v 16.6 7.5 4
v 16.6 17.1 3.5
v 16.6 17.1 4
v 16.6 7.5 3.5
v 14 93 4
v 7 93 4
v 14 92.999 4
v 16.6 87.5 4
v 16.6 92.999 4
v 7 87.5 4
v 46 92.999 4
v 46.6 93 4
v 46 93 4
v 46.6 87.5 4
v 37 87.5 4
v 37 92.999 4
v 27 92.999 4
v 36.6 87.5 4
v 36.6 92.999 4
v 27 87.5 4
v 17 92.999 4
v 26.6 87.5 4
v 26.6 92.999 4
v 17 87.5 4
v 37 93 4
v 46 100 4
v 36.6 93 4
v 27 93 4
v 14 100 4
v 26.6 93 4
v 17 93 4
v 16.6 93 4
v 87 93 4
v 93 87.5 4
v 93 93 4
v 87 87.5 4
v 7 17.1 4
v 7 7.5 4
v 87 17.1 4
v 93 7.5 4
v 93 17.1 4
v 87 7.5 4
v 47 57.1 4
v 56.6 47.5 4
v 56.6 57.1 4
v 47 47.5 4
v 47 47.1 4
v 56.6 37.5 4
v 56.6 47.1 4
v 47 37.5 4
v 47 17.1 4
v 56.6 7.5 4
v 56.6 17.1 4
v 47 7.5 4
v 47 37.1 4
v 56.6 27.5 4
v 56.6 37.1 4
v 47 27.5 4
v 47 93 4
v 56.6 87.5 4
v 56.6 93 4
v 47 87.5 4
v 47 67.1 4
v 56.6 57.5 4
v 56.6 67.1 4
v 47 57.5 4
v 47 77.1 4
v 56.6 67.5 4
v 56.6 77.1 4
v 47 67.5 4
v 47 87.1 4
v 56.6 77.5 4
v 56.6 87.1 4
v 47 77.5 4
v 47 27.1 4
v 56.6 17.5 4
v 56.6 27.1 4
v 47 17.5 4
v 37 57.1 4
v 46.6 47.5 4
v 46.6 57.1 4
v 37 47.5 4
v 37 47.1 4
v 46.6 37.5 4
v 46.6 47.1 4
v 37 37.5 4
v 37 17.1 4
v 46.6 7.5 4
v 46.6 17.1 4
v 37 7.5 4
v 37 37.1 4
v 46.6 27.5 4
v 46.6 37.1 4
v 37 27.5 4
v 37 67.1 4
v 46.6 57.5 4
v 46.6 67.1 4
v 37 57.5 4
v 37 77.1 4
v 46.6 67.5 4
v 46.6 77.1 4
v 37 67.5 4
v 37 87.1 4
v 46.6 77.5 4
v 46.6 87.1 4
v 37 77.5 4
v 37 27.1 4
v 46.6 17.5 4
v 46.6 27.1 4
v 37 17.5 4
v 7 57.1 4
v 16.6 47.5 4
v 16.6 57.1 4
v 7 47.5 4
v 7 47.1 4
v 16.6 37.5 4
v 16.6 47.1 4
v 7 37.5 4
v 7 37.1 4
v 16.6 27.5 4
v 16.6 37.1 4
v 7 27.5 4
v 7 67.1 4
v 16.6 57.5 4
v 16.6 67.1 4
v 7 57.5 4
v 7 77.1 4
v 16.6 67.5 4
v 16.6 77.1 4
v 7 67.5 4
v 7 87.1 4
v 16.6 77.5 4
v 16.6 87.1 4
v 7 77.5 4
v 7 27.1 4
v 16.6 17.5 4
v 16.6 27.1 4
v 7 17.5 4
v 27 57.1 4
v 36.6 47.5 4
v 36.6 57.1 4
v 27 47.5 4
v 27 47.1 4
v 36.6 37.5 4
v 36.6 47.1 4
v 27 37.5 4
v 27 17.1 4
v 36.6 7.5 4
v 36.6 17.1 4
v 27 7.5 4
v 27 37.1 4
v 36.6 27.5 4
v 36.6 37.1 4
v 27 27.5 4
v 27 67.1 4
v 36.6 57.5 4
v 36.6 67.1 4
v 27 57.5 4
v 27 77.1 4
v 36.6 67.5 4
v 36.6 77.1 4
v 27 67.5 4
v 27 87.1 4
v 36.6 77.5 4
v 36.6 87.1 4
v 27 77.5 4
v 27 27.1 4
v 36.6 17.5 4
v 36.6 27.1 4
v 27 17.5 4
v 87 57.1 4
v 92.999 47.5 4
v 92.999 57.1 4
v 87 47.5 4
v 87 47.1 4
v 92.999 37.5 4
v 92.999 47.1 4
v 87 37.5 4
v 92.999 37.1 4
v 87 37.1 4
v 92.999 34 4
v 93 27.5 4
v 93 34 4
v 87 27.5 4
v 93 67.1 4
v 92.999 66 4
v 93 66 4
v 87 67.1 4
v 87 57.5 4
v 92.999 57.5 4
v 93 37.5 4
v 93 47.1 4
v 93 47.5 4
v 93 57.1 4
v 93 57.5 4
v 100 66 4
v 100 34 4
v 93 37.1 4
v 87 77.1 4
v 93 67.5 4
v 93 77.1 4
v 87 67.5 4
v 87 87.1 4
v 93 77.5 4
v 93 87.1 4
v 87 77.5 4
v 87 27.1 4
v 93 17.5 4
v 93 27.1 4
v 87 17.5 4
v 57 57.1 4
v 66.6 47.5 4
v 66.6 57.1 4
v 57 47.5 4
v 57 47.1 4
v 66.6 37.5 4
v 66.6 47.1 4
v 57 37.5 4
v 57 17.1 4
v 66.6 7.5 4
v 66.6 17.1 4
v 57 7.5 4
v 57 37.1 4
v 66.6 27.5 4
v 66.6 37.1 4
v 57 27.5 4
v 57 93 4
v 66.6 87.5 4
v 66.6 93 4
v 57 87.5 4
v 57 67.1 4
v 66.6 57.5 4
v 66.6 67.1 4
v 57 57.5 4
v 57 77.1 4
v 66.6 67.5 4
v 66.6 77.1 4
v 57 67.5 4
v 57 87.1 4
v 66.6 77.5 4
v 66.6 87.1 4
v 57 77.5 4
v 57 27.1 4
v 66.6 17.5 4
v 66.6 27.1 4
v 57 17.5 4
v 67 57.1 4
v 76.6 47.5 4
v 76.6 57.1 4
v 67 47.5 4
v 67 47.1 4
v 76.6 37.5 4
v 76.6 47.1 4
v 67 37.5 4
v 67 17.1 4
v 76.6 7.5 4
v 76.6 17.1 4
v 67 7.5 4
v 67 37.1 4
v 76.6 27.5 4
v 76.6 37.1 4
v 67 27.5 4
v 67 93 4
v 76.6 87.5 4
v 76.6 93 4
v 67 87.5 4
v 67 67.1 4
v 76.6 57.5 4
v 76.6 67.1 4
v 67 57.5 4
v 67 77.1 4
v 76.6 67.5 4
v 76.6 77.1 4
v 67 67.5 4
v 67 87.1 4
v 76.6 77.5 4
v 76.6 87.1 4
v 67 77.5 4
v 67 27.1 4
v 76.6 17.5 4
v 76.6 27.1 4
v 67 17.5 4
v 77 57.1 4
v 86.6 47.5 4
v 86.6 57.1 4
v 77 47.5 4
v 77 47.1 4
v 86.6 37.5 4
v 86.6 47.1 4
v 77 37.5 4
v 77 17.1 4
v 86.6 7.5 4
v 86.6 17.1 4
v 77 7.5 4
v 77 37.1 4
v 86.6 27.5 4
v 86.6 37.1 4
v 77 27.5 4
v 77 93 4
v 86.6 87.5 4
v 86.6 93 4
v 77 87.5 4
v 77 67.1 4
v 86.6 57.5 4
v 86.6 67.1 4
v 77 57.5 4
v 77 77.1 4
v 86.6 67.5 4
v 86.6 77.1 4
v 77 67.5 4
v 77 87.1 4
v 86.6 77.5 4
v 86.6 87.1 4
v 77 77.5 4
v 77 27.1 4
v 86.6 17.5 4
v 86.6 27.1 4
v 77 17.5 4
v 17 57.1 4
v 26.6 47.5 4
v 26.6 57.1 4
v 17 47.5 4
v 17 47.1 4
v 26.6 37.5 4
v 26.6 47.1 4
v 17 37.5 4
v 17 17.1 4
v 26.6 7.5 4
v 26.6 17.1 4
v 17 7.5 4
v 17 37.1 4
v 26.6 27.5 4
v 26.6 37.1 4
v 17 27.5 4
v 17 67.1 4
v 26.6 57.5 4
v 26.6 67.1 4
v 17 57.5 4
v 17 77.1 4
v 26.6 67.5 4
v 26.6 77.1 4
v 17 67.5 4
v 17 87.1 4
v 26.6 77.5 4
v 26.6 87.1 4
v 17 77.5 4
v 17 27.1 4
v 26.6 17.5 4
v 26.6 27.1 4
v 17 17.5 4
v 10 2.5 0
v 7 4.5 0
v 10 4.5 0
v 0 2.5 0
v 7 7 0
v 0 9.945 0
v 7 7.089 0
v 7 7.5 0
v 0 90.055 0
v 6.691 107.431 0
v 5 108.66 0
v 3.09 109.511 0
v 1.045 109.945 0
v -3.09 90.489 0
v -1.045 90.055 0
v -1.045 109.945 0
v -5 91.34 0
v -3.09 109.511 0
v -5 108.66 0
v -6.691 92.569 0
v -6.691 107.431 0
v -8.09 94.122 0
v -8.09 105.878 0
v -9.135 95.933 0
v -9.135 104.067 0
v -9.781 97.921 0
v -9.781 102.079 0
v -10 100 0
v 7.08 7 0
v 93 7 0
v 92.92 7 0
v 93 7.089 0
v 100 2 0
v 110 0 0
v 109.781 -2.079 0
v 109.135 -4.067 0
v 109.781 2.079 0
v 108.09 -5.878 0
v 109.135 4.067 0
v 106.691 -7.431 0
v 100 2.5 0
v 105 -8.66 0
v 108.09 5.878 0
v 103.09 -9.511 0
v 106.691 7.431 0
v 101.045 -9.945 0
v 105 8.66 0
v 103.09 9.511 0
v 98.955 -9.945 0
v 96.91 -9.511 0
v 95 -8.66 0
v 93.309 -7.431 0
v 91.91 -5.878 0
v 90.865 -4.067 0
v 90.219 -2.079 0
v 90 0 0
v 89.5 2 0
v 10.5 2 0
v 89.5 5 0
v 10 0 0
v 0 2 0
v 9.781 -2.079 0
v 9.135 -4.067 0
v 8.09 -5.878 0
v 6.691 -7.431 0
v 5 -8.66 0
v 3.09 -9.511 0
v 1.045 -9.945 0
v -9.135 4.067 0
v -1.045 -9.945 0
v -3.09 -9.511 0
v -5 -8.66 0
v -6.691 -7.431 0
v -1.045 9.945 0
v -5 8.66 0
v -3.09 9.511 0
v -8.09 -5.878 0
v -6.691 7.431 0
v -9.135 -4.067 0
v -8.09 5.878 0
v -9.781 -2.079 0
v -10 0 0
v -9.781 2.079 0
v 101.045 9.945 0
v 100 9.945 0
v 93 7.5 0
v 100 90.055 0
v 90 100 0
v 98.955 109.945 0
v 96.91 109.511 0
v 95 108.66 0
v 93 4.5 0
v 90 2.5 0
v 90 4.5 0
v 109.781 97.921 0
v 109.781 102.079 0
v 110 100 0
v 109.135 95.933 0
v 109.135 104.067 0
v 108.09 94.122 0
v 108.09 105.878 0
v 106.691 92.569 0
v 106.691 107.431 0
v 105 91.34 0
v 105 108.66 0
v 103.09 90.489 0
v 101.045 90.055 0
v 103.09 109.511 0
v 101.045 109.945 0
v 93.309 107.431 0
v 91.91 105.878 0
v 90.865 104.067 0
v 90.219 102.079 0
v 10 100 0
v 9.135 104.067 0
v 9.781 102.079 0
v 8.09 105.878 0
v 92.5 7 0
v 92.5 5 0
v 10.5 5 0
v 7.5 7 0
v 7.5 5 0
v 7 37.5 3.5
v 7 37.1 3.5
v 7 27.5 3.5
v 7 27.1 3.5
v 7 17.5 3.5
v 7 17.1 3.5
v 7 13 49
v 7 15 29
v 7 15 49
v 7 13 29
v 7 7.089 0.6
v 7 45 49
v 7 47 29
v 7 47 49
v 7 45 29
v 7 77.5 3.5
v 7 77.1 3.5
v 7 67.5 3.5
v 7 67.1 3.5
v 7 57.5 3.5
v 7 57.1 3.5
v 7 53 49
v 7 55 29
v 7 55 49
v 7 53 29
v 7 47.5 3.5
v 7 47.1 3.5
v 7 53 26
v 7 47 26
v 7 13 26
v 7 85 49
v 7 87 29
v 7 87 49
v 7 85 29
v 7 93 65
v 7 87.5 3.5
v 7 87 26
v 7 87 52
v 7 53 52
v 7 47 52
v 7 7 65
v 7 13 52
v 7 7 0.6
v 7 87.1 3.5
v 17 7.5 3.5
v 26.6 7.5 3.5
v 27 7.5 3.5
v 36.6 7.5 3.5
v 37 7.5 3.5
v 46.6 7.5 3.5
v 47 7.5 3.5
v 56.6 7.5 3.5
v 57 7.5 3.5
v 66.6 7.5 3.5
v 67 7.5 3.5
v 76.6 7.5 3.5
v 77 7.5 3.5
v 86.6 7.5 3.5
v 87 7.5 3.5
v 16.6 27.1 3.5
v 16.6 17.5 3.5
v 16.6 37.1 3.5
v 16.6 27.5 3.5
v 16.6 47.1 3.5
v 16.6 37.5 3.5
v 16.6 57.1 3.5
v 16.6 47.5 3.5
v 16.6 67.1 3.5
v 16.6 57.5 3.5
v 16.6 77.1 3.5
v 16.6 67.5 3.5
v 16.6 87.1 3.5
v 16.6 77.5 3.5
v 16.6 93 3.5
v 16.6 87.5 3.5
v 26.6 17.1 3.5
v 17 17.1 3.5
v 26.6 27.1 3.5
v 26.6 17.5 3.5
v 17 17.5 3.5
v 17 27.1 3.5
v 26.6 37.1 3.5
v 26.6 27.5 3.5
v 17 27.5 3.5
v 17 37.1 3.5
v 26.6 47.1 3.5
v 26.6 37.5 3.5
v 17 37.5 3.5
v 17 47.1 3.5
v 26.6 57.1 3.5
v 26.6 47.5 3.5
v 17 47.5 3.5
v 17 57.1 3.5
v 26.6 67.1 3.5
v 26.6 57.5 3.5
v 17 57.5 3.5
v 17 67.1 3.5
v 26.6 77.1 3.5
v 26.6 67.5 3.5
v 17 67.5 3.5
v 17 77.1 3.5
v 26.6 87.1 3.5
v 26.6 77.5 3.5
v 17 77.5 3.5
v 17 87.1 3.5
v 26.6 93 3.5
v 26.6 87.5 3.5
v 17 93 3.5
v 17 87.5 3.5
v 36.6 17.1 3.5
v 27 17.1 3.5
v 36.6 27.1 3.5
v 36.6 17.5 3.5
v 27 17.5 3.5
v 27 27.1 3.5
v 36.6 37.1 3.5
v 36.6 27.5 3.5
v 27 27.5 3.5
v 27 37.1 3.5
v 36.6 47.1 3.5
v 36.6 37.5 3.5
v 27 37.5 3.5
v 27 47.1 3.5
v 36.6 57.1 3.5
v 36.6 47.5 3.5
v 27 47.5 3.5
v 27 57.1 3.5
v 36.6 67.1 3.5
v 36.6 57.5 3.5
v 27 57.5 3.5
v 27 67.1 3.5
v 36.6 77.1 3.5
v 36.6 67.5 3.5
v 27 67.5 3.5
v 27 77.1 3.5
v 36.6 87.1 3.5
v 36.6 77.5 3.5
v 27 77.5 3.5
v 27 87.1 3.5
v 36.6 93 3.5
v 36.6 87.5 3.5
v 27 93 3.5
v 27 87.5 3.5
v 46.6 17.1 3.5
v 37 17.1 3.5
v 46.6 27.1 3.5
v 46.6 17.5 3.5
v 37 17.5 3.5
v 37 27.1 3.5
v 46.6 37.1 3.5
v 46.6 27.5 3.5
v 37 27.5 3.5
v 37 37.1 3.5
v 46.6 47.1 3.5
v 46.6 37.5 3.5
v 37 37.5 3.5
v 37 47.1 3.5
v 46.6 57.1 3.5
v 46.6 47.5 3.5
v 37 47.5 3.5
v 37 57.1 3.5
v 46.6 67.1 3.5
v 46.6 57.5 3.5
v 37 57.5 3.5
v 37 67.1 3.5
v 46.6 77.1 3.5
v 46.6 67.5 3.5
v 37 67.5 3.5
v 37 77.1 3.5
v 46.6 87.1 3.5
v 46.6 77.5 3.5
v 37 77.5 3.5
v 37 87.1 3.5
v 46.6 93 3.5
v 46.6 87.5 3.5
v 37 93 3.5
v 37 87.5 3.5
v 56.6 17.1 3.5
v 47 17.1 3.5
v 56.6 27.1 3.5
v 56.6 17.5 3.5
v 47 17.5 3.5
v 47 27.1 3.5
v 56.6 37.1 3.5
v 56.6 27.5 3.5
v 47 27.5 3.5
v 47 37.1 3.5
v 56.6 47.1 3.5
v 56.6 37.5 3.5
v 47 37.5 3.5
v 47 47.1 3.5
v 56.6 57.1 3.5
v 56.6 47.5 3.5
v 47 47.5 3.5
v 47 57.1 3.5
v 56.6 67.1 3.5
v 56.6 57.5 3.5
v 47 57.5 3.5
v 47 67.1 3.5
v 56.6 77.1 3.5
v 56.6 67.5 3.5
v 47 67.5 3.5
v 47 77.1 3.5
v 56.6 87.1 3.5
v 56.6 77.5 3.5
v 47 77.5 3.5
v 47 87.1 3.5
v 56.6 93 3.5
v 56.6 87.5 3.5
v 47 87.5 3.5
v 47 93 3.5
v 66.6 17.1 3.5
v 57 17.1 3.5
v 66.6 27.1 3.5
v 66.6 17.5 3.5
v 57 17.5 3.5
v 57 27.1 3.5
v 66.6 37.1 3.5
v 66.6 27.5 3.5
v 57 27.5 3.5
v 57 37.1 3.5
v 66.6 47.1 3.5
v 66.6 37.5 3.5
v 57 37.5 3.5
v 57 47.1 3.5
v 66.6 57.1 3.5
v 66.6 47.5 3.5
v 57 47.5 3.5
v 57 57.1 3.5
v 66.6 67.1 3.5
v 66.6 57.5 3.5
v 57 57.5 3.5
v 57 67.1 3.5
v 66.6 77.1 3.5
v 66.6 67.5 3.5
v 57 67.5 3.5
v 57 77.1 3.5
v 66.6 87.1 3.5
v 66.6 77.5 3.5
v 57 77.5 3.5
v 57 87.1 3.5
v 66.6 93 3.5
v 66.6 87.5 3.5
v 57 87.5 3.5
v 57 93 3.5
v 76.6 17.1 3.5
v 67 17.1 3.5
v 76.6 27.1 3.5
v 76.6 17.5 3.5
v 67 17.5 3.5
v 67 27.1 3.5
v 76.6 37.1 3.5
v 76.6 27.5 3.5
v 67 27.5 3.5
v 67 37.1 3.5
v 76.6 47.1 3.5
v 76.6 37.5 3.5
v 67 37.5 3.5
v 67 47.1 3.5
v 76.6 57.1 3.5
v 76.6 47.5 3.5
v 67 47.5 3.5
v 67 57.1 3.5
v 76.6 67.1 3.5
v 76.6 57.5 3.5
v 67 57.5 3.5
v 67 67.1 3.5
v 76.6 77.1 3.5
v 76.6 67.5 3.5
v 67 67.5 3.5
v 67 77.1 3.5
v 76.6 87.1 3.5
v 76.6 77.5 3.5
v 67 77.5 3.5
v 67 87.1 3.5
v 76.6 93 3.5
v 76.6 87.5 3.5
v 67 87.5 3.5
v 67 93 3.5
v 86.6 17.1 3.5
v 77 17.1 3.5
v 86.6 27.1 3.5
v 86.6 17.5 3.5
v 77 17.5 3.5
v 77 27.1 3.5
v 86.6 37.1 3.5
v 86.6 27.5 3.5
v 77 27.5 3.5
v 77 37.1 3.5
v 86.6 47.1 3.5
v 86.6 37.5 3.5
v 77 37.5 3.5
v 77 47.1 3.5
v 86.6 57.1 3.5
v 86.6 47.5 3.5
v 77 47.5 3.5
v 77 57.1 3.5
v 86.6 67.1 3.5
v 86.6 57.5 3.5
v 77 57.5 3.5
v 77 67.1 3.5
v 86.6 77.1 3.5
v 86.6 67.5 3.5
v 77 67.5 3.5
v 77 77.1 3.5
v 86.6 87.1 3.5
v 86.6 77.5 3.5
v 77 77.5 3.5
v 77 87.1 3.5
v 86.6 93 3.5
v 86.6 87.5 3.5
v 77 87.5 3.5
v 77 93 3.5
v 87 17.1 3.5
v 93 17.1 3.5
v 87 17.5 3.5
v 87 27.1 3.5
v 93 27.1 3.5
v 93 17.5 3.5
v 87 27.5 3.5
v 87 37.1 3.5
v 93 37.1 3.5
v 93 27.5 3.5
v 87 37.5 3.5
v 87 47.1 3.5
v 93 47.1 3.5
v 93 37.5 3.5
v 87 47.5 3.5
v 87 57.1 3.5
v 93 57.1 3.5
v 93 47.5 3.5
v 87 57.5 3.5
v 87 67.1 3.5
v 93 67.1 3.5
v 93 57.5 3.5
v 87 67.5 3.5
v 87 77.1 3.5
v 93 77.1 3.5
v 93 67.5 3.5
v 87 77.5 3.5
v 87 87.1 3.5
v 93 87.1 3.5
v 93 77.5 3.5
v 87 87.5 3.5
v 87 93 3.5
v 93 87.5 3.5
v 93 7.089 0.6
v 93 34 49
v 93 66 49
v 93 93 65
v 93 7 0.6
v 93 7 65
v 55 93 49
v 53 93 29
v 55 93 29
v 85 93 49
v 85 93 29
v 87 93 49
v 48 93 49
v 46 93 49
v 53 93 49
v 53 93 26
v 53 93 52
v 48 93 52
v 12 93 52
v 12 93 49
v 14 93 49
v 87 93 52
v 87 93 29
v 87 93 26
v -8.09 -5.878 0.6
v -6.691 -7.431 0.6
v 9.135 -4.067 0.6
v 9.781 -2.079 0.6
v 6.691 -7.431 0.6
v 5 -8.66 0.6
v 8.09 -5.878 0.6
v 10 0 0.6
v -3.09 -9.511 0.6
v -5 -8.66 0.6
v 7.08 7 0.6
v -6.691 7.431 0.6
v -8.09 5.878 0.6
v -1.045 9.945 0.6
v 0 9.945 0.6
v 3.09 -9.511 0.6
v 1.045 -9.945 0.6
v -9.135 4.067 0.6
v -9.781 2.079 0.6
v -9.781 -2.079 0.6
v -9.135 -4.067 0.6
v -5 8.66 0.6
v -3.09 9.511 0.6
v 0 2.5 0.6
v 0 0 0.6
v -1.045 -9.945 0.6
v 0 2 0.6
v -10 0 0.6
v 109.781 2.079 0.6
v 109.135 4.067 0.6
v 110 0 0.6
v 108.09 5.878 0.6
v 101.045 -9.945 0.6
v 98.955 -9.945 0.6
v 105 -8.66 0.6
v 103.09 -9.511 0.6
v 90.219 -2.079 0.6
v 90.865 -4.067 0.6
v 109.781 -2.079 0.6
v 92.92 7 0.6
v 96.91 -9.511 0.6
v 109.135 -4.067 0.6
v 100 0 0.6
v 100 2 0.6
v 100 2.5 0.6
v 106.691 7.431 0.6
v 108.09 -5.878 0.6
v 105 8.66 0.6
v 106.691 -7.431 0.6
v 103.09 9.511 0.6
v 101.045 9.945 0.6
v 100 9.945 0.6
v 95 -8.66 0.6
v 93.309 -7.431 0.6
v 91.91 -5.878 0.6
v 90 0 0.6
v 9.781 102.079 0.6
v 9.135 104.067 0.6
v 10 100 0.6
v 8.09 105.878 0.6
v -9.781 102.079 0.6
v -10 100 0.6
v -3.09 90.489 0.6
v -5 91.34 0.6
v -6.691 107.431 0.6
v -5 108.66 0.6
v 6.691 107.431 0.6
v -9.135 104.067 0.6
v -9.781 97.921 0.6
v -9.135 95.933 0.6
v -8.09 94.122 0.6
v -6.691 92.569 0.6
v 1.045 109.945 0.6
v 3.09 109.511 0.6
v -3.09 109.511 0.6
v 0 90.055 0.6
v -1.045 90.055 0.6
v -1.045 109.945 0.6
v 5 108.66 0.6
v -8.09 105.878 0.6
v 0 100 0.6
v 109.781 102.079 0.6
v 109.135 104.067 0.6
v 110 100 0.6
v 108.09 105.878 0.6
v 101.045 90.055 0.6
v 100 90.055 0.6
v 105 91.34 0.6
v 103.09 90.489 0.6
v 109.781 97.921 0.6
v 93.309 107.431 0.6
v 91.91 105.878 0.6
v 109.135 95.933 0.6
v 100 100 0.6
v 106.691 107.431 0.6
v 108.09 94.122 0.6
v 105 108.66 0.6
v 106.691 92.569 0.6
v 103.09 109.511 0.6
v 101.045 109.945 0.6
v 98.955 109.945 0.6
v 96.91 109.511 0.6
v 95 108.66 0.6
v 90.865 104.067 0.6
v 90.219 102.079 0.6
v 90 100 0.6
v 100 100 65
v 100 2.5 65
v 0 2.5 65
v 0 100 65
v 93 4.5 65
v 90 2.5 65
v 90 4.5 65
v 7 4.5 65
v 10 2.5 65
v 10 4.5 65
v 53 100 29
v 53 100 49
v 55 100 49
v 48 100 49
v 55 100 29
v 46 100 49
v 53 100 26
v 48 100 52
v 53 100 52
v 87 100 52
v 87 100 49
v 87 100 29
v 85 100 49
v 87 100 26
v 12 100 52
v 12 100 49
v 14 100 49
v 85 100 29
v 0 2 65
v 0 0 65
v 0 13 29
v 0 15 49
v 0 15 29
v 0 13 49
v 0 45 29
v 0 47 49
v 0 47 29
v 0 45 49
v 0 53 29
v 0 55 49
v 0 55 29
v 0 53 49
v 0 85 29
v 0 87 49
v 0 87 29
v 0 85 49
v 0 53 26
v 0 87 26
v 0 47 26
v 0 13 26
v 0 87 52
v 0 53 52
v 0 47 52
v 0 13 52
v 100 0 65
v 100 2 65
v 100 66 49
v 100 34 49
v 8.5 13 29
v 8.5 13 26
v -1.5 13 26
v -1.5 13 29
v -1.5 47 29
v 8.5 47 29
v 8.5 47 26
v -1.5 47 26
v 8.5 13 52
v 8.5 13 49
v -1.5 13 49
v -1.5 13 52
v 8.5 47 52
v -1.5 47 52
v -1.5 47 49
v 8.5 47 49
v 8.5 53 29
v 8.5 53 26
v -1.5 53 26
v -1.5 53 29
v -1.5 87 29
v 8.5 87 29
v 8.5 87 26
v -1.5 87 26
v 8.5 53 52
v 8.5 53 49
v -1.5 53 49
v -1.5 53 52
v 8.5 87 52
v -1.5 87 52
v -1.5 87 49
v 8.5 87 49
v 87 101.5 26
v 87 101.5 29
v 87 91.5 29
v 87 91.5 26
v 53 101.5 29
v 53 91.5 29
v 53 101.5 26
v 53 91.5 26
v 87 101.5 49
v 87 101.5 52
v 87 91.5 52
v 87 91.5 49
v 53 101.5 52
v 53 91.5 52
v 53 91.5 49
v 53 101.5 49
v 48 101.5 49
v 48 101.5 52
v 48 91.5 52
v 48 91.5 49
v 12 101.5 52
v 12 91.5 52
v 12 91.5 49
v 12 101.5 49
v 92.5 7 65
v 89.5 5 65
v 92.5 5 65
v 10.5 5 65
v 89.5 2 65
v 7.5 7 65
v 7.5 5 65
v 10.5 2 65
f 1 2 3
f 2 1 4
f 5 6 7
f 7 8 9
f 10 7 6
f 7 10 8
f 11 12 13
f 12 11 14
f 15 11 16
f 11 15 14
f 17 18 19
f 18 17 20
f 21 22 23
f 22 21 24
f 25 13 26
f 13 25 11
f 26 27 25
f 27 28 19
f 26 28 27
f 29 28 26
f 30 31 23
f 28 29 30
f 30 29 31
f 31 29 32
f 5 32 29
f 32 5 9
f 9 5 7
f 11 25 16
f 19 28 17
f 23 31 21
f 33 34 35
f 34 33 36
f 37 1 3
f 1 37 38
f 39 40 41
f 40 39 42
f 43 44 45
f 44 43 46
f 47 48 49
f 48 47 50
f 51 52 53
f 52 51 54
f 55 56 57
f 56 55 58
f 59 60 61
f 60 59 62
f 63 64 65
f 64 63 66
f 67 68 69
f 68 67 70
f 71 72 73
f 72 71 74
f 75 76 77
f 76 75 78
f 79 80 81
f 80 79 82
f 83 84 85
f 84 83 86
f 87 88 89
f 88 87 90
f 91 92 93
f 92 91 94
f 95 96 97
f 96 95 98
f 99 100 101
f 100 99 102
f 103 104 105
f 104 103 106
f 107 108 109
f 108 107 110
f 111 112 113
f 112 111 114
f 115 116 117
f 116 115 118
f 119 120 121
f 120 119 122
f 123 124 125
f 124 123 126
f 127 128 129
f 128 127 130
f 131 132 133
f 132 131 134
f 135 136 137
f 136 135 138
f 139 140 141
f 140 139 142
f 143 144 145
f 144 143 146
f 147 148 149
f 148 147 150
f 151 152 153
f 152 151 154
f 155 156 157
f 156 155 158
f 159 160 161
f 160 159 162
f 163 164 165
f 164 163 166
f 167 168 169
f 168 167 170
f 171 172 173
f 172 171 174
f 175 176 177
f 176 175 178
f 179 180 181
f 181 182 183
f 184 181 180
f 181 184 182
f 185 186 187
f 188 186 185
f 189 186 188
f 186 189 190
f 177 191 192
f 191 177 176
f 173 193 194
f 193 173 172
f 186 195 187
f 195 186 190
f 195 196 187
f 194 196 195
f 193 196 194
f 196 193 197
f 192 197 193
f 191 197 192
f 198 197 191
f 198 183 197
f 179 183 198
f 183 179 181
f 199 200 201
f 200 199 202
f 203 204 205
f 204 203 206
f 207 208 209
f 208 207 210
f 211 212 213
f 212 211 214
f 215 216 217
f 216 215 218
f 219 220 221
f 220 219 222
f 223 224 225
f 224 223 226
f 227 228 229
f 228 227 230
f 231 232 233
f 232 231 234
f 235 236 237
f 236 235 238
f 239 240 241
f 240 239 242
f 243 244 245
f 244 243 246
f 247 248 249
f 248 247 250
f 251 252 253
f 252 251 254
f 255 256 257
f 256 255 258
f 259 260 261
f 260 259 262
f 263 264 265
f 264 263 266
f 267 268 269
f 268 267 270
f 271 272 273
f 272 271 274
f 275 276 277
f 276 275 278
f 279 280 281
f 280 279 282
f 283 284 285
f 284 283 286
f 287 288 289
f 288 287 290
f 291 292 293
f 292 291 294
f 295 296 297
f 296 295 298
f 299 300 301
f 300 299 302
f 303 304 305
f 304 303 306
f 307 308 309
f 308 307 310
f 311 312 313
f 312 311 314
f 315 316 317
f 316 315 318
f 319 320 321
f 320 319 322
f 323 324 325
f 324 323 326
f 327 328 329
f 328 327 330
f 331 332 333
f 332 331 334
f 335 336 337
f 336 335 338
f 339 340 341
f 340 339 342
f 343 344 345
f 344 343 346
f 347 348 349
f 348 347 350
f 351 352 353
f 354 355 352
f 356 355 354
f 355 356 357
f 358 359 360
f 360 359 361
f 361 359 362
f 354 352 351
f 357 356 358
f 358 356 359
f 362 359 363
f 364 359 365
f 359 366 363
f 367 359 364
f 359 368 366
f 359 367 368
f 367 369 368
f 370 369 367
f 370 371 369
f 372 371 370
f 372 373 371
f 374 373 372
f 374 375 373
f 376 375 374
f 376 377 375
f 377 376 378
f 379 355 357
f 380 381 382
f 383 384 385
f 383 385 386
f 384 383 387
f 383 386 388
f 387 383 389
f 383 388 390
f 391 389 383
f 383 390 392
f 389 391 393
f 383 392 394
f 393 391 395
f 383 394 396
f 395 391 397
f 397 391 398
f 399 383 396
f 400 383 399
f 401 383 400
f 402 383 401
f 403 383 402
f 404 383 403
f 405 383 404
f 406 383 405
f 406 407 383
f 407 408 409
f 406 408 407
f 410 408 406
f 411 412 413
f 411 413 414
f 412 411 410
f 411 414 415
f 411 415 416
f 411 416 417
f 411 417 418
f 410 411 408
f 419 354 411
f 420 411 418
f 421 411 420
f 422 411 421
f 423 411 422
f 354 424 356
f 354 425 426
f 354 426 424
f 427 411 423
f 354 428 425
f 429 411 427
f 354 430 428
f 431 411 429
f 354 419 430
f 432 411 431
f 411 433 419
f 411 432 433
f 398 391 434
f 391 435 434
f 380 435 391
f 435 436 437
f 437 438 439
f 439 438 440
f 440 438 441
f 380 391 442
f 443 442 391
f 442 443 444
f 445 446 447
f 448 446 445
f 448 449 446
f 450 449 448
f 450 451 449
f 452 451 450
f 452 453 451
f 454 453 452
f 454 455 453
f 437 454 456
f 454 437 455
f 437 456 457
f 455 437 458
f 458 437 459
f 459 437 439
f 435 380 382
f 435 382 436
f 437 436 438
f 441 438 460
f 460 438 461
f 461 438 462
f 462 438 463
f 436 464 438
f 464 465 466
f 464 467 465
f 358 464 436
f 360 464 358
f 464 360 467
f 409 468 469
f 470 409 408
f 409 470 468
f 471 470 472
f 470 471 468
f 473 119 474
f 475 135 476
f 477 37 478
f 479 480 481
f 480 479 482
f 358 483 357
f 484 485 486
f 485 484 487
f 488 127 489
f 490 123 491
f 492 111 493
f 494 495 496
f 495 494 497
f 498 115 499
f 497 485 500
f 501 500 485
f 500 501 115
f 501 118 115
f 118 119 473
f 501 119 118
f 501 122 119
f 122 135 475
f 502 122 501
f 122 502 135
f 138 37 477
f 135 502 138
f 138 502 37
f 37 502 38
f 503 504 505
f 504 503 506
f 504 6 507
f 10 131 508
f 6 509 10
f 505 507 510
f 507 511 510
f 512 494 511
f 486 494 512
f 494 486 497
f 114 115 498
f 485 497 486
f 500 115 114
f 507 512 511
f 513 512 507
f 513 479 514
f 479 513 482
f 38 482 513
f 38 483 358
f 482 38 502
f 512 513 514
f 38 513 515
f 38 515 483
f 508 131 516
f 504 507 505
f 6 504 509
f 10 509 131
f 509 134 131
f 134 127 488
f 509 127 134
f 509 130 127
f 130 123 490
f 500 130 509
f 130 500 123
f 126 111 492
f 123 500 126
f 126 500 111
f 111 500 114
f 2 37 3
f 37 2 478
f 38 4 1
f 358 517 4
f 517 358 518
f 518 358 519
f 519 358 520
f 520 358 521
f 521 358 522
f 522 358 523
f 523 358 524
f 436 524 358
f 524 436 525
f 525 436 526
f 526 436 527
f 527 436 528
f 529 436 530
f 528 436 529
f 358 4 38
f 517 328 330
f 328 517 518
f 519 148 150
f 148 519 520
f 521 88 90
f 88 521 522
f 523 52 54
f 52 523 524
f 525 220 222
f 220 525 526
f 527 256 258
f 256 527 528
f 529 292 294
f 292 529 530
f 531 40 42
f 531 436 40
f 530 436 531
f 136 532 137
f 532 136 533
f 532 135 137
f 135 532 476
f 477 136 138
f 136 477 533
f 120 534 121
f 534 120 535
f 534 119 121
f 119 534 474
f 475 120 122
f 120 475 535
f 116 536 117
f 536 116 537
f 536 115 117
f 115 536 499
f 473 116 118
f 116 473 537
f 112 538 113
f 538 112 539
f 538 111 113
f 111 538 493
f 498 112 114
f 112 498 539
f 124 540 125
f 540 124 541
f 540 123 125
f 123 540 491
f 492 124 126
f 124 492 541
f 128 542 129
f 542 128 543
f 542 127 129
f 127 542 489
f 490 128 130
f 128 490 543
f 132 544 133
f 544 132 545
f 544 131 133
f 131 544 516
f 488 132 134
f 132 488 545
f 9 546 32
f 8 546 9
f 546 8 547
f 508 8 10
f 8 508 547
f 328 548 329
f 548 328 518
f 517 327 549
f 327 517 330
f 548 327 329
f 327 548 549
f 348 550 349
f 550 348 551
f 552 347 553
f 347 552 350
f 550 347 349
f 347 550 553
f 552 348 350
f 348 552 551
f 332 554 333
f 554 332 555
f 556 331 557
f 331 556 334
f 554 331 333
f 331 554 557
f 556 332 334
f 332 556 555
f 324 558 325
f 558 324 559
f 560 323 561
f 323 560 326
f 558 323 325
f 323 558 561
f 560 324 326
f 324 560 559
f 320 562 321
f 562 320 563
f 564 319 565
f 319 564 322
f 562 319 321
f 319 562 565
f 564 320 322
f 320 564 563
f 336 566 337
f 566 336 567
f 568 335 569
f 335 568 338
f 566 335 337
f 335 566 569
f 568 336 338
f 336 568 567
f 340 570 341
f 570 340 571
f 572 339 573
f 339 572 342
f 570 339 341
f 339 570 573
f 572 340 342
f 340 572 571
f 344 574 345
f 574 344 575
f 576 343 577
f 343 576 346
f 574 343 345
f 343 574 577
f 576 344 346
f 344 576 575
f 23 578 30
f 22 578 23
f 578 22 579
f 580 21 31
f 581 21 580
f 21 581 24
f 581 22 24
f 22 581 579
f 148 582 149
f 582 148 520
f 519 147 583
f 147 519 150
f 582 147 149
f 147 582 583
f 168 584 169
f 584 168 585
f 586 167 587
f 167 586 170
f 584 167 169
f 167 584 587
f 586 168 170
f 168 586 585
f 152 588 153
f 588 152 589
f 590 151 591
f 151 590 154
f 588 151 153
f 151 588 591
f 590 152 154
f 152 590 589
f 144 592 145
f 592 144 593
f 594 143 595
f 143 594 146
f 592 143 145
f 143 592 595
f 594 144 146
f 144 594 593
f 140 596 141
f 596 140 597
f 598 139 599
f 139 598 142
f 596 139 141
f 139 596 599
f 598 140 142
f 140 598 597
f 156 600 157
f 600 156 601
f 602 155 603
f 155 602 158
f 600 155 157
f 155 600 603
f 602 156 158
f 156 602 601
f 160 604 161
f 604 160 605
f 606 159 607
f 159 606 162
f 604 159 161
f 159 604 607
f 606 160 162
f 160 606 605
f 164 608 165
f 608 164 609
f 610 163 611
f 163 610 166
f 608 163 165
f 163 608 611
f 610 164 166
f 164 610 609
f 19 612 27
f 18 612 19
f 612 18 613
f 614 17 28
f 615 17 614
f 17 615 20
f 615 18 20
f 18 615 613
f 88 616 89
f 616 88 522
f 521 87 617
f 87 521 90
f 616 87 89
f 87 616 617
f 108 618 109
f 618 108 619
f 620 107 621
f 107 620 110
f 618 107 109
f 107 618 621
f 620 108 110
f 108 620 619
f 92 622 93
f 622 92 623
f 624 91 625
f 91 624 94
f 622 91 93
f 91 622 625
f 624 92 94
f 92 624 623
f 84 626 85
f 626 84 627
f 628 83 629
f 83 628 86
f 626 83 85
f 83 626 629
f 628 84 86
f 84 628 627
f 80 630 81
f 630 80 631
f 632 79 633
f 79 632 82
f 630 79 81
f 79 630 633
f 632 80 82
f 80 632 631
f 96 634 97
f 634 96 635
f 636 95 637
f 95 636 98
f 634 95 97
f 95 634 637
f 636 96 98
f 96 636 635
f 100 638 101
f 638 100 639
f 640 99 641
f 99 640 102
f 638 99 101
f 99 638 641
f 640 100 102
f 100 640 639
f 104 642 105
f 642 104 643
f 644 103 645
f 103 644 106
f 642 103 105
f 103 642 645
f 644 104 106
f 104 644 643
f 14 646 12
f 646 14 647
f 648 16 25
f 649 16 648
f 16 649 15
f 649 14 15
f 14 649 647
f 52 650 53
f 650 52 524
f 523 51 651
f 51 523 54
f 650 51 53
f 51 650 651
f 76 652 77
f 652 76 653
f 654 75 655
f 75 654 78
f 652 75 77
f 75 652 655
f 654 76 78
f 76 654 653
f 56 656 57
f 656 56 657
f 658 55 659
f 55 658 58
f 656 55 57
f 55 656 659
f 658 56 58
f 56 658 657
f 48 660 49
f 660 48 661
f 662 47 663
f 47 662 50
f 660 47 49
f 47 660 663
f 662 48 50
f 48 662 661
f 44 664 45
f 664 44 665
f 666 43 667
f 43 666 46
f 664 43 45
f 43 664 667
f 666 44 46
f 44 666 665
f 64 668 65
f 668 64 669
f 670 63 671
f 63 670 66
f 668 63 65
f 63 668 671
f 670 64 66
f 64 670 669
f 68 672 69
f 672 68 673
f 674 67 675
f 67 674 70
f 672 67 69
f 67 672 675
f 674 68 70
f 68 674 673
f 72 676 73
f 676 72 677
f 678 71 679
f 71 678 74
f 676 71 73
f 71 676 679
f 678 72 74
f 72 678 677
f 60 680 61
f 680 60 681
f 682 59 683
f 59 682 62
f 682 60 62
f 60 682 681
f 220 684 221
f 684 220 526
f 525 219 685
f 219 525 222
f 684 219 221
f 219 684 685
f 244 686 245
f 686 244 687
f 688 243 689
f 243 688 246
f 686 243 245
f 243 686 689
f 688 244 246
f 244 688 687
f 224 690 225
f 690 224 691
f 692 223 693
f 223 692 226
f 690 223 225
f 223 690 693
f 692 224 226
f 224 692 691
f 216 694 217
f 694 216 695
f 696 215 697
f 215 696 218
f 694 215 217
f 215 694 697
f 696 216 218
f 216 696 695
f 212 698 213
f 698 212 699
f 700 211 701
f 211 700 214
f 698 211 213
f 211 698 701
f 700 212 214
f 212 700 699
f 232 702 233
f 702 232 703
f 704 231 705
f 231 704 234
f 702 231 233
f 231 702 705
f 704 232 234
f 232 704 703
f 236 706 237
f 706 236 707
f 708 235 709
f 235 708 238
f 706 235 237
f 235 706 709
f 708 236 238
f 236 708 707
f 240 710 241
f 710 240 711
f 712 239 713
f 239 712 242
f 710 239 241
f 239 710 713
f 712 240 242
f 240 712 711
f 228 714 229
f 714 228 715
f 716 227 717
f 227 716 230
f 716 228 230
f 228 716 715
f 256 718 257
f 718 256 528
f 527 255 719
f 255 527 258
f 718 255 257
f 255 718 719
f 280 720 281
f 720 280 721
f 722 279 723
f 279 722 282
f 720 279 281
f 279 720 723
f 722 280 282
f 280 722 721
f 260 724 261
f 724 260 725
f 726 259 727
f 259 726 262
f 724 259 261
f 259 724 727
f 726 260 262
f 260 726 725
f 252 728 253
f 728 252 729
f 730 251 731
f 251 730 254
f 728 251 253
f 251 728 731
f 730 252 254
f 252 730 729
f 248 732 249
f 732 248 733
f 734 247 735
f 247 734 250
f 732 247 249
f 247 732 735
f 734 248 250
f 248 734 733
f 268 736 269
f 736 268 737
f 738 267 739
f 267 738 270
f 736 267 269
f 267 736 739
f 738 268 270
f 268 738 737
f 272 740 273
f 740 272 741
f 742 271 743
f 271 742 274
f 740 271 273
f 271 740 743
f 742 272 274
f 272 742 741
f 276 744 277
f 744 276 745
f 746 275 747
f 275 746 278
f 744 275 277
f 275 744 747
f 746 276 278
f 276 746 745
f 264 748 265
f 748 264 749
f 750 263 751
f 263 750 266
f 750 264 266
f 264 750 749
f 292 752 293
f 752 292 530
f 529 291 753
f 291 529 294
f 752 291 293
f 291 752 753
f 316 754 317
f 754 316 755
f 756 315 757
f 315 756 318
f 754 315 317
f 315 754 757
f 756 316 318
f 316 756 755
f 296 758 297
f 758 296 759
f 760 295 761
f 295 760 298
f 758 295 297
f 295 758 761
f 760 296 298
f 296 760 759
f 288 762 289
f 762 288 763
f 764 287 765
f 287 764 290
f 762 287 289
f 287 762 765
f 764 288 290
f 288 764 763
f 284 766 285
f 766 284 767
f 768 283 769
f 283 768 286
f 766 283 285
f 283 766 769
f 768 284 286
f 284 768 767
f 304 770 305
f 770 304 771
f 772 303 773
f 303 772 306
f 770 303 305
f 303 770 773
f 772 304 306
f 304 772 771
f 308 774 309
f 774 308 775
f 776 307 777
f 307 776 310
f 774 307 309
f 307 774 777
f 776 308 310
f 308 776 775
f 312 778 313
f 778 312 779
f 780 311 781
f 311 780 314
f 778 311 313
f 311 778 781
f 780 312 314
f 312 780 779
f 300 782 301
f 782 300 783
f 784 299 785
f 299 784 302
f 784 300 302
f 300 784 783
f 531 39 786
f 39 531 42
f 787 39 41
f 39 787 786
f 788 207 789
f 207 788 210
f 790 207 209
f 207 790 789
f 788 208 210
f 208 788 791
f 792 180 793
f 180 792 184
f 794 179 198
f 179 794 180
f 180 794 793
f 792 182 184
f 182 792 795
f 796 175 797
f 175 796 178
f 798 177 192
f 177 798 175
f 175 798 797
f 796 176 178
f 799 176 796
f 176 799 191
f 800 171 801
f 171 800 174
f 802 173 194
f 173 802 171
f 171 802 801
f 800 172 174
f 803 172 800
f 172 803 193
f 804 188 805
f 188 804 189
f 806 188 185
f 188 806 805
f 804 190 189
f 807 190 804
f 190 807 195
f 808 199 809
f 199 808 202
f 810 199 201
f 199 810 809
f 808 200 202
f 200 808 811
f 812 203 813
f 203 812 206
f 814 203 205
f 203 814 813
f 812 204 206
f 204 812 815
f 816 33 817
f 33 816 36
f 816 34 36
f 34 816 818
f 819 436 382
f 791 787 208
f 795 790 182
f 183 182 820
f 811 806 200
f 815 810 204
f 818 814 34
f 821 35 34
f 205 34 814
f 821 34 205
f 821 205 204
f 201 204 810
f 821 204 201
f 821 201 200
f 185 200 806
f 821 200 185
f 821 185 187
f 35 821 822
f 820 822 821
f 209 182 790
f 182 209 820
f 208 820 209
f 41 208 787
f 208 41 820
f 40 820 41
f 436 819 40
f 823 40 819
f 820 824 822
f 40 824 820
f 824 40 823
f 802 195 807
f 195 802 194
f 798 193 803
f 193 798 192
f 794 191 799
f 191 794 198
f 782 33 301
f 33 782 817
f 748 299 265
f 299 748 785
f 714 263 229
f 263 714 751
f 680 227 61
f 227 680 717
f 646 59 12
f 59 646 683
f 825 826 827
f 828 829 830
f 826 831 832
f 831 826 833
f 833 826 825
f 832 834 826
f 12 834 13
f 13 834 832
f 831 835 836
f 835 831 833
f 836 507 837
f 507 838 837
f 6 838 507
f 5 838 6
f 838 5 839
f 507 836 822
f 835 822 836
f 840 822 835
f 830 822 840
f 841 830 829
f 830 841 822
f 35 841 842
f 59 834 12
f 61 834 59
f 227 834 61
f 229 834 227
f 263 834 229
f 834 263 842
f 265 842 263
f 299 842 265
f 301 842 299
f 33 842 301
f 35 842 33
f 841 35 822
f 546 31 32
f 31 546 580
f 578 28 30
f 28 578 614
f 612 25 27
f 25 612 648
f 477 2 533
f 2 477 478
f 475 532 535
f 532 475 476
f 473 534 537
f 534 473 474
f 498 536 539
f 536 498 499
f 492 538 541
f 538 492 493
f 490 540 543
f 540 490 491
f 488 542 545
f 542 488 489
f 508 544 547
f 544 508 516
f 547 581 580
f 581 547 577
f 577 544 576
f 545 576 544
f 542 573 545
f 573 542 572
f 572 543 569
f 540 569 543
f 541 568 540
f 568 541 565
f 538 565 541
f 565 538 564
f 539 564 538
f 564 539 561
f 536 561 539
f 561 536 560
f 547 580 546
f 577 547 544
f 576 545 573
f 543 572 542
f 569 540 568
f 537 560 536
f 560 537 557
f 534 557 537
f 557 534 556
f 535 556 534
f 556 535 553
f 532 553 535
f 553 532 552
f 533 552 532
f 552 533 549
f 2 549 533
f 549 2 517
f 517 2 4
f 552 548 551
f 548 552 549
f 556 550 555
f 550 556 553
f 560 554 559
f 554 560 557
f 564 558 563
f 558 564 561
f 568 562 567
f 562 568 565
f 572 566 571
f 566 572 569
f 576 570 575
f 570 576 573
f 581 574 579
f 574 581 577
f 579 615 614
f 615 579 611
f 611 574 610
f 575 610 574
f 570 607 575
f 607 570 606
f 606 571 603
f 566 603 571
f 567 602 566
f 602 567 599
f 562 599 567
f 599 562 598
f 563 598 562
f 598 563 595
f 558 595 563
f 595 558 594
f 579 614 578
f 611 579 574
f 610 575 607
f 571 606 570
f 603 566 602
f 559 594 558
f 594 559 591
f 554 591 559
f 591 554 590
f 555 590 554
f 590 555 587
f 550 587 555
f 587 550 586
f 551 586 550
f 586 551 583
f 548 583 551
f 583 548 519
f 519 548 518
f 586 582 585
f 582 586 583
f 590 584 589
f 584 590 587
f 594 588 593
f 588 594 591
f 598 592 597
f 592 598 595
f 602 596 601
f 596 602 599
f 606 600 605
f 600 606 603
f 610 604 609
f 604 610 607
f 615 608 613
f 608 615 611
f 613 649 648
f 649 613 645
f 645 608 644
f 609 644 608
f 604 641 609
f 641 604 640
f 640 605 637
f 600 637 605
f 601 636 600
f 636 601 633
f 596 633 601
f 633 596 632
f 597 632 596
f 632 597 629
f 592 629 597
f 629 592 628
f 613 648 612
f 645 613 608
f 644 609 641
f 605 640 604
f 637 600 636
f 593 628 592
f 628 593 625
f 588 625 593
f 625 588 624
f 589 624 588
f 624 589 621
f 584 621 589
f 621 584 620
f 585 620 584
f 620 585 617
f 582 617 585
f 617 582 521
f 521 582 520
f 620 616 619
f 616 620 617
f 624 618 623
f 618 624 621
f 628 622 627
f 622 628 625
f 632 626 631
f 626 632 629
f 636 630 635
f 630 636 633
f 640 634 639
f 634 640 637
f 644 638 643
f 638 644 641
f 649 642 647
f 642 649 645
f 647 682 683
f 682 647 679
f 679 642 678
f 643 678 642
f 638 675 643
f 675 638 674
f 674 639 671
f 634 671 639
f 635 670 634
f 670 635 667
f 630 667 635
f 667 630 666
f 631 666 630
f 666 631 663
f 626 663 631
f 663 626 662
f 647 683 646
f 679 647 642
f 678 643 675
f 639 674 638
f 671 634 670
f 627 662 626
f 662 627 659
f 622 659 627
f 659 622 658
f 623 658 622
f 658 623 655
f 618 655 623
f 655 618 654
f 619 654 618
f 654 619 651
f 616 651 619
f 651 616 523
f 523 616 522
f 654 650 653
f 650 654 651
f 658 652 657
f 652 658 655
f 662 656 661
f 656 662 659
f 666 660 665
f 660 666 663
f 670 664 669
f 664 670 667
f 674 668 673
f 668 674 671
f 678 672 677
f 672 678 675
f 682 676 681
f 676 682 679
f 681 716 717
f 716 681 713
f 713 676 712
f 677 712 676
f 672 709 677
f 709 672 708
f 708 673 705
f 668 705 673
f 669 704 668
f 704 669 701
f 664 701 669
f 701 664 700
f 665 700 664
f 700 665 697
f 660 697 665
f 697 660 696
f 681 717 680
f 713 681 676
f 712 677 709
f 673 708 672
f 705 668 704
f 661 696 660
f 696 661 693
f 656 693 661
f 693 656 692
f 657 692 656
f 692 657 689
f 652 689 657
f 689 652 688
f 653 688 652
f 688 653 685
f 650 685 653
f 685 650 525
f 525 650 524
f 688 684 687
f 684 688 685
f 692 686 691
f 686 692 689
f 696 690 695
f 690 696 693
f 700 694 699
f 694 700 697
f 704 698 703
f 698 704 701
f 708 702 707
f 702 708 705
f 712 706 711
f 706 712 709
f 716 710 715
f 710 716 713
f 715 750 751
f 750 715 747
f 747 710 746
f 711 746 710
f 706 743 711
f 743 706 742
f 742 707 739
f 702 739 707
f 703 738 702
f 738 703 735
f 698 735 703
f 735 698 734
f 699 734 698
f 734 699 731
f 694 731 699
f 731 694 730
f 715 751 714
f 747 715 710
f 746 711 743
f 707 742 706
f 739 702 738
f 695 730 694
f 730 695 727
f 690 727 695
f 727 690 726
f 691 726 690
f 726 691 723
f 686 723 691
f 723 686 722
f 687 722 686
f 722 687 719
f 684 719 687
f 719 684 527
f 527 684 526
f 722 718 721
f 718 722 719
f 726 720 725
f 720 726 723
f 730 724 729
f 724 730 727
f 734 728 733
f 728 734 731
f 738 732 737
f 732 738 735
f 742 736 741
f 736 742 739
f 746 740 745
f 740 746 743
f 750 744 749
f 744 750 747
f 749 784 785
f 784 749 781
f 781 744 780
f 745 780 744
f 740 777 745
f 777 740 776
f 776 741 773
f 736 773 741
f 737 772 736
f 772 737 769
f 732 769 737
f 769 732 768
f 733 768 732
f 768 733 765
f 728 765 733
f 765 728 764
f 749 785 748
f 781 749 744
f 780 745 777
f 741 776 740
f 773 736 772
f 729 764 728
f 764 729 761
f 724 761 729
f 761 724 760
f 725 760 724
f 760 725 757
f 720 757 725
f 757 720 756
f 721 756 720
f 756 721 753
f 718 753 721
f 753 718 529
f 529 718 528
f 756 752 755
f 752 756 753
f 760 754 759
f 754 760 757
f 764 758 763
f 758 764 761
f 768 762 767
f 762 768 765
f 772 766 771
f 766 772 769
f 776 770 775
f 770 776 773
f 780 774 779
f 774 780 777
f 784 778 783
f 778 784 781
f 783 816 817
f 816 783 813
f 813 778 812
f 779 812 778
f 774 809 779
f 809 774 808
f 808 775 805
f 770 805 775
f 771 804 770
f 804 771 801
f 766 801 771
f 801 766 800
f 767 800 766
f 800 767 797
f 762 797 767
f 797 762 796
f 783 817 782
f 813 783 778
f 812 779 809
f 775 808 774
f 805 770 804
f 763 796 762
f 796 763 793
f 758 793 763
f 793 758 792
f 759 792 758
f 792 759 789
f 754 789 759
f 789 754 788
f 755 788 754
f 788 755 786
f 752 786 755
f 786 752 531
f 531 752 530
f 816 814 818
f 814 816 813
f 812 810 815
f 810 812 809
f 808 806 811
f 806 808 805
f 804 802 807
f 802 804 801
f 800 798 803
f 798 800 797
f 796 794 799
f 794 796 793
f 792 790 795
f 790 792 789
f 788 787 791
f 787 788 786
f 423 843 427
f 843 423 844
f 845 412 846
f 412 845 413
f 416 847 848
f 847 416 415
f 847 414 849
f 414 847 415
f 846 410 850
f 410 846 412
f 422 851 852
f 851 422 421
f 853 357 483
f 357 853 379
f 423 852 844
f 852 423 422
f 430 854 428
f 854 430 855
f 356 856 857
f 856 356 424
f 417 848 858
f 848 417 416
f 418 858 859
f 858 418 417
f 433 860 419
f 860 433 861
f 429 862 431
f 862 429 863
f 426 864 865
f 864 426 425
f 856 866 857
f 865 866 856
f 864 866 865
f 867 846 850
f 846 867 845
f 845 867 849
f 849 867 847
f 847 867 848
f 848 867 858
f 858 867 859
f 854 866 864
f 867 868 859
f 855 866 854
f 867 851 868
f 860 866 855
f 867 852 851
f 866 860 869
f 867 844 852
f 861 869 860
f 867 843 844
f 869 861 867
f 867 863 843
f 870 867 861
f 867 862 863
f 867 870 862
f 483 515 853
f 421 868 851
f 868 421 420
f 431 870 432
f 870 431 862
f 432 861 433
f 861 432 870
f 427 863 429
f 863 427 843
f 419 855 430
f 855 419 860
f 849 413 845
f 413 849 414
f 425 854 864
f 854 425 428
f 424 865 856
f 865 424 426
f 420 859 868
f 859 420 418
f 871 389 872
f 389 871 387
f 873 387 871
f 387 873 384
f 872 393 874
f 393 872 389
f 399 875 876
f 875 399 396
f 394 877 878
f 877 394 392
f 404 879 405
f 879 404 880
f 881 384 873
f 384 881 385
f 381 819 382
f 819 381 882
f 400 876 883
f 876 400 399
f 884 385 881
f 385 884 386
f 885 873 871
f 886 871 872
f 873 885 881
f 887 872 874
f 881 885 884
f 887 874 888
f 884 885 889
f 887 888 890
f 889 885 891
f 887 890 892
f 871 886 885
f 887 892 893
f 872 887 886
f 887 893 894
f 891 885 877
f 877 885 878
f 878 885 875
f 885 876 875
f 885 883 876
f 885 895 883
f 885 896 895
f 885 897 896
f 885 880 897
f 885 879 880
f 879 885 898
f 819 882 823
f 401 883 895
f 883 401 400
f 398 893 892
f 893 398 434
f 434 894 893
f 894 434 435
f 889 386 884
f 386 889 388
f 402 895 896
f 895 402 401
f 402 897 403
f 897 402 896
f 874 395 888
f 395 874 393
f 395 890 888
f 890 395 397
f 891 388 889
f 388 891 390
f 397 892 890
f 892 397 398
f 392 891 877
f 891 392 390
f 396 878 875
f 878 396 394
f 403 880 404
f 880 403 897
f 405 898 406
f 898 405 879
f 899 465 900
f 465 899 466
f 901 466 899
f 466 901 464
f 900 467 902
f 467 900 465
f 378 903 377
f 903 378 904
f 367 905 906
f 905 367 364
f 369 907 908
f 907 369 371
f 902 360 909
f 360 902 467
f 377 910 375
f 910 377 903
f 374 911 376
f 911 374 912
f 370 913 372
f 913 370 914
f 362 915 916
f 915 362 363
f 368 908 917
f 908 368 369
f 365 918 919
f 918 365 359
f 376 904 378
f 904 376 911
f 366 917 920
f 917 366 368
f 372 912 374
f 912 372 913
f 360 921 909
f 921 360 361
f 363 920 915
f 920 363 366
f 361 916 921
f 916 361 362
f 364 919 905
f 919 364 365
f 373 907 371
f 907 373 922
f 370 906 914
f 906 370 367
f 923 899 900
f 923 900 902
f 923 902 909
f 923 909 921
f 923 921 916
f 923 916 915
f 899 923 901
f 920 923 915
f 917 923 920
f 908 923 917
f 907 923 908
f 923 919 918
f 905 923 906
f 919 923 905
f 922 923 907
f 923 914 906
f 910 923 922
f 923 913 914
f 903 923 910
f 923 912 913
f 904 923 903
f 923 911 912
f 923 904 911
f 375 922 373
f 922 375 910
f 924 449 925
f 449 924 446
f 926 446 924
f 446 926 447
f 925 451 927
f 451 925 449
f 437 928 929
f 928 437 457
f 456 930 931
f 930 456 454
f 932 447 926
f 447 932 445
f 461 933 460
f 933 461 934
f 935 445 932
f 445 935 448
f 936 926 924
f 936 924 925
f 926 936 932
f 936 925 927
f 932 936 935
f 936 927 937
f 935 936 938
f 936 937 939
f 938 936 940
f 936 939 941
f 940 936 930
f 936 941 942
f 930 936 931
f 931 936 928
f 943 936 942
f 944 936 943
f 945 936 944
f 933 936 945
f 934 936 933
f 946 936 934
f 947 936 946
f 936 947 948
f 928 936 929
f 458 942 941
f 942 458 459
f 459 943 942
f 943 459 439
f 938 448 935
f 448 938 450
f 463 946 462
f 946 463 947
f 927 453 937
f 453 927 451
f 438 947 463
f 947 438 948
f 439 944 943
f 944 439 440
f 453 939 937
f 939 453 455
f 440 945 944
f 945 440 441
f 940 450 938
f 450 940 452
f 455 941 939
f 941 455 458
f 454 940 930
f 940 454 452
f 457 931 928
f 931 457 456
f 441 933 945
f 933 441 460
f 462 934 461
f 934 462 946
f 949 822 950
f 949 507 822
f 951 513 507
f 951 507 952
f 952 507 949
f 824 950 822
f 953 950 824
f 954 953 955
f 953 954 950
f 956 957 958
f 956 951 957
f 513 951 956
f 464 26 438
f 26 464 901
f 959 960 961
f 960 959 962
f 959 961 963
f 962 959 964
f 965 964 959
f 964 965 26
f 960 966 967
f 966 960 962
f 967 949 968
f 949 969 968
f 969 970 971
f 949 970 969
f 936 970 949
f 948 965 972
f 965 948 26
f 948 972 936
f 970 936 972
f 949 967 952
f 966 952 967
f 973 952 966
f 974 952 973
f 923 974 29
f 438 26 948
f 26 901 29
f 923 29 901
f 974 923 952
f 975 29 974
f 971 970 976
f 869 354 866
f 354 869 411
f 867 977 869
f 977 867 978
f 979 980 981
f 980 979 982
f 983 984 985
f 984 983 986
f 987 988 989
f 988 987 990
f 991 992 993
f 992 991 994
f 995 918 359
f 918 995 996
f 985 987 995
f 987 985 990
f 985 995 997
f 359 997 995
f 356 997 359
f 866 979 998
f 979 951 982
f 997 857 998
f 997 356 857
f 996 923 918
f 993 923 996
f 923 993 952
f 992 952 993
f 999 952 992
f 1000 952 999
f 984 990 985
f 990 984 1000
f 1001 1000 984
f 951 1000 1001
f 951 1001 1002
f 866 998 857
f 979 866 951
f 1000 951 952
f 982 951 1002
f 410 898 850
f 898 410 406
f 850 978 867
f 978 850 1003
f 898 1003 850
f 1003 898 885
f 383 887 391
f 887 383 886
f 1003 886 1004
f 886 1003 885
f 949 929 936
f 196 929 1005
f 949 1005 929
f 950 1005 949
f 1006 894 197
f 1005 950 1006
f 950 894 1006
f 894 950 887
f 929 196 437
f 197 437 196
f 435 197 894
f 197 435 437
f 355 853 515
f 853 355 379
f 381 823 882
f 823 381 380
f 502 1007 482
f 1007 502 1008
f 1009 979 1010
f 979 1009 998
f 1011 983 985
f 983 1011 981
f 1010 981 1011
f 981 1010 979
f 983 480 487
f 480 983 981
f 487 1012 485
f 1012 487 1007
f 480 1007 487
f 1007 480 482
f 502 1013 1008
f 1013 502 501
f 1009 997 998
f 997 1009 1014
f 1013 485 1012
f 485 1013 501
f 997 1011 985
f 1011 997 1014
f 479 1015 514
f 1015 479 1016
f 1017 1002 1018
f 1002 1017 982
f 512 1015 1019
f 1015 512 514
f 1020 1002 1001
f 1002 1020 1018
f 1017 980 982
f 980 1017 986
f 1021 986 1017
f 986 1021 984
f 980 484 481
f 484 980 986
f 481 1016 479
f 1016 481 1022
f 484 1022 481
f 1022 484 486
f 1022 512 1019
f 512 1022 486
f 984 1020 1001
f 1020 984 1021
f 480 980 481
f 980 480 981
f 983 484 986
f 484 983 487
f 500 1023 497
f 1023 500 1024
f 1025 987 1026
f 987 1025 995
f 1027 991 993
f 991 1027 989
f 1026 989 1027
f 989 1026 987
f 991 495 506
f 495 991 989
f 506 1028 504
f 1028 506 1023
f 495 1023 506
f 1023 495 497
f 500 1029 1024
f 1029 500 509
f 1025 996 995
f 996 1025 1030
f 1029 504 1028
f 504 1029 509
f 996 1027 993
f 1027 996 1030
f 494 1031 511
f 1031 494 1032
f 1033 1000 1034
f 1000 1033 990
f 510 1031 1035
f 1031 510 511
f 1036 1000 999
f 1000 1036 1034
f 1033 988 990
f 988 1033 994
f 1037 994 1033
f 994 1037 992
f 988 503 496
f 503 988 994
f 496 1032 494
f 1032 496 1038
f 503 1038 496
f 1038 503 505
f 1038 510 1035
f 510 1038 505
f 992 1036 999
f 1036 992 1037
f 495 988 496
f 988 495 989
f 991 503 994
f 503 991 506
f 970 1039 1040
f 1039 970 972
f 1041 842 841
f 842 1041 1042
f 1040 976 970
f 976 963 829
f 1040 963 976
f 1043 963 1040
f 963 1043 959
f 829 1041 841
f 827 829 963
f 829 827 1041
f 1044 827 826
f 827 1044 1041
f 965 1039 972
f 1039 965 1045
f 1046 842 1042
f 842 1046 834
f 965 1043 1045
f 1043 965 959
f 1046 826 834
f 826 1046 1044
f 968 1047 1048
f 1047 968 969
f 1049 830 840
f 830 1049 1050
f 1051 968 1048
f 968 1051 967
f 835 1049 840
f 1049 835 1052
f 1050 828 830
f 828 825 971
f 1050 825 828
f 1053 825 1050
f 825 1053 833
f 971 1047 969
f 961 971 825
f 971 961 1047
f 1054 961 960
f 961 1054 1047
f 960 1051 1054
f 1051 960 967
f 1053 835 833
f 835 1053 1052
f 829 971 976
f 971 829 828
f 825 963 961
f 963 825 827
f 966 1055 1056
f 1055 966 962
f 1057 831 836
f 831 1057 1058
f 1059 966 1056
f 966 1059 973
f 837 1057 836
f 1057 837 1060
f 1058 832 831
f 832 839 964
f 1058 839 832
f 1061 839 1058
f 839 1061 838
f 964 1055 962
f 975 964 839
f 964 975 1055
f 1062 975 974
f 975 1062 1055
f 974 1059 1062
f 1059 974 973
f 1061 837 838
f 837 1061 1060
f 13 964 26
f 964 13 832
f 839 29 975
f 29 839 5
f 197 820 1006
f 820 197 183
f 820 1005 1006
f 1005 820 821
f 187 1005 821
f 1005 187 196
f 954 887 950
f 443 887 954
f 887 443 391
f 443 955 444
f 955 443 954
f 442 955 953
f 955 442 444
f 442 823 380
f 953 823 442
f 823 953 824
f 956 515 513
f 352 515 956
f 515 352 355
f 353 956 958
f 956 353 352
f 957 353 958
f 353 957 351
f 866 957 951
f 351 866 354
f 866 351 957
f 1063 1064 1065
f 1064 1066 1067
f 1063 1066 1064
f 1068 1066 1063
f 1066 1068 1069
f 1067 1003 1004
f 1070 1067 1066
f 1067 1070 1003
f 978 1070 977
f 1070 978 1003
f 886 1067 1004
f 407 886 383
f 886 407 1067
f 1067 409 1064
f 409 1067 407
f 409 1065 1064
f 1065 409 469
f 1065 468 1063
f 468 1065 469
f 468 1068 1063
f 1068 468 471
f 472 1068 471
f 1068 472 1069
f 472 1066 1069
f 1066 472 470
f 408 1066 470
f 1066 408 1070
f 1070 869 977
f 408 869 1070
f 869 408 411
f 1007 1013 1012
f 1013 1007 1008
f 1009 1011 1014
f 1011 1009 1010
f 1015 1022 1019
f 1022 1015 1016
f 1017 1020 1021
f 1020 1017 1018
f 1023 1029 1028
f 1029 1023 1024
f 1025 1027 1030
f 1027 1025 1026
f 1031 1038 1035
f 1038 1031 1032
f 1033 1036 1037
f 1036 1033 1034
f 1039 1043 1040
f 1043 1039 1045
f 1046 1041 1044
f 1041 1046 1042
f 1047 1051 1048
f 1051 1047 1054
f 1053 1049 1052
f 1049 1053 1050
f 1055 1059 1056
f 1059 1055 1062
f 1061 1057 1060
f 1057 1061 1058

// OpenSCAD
use <building.scad>

// mirror([1,0,0]) building(b1Dims, b1Windows, b1Doors);
building(b1Dims, b1Windows, b1Doors);

/* Dims is a vector holding dimensions of the building 
 * [X, Y, height, wall thickness, floor/roof thickness].
 */
b1Dims = [100, // xdim
	     100, // ydim
	     65, // height
	     7, // wall thickness
	     4, // floor/roof thickness
	     1]; // ears 

/* Windows is a 3D array holding translate : rotate pairs, one per window.
 * 
 */
b1Windows = [[[0, 30, 0], [0,0,-90]],
		    [[0, 70, 0], [0,0,-90]],
		    [[70,93,0], [0,0,0]],
		   ];

/* Doors is a 3D array holding translate : rotate : boolean tuples, one per
 * door.
 * Booleans are [ doFrame, unused, unused ].
 */
b1Doors = [[[30, 93, 0], [0,0,0], [1,0,0]],
	   	  [[93, 50, 0], [0,0,-90], [0,0,0]],
          ];

/*
 * Local variables:
 *  mode: C
 *  c-indent-level: 4
 *  c-basic-offset: 4
 * End:
 *
 * vim: ts=8 sts=4 sw=4 expandtab
 */
